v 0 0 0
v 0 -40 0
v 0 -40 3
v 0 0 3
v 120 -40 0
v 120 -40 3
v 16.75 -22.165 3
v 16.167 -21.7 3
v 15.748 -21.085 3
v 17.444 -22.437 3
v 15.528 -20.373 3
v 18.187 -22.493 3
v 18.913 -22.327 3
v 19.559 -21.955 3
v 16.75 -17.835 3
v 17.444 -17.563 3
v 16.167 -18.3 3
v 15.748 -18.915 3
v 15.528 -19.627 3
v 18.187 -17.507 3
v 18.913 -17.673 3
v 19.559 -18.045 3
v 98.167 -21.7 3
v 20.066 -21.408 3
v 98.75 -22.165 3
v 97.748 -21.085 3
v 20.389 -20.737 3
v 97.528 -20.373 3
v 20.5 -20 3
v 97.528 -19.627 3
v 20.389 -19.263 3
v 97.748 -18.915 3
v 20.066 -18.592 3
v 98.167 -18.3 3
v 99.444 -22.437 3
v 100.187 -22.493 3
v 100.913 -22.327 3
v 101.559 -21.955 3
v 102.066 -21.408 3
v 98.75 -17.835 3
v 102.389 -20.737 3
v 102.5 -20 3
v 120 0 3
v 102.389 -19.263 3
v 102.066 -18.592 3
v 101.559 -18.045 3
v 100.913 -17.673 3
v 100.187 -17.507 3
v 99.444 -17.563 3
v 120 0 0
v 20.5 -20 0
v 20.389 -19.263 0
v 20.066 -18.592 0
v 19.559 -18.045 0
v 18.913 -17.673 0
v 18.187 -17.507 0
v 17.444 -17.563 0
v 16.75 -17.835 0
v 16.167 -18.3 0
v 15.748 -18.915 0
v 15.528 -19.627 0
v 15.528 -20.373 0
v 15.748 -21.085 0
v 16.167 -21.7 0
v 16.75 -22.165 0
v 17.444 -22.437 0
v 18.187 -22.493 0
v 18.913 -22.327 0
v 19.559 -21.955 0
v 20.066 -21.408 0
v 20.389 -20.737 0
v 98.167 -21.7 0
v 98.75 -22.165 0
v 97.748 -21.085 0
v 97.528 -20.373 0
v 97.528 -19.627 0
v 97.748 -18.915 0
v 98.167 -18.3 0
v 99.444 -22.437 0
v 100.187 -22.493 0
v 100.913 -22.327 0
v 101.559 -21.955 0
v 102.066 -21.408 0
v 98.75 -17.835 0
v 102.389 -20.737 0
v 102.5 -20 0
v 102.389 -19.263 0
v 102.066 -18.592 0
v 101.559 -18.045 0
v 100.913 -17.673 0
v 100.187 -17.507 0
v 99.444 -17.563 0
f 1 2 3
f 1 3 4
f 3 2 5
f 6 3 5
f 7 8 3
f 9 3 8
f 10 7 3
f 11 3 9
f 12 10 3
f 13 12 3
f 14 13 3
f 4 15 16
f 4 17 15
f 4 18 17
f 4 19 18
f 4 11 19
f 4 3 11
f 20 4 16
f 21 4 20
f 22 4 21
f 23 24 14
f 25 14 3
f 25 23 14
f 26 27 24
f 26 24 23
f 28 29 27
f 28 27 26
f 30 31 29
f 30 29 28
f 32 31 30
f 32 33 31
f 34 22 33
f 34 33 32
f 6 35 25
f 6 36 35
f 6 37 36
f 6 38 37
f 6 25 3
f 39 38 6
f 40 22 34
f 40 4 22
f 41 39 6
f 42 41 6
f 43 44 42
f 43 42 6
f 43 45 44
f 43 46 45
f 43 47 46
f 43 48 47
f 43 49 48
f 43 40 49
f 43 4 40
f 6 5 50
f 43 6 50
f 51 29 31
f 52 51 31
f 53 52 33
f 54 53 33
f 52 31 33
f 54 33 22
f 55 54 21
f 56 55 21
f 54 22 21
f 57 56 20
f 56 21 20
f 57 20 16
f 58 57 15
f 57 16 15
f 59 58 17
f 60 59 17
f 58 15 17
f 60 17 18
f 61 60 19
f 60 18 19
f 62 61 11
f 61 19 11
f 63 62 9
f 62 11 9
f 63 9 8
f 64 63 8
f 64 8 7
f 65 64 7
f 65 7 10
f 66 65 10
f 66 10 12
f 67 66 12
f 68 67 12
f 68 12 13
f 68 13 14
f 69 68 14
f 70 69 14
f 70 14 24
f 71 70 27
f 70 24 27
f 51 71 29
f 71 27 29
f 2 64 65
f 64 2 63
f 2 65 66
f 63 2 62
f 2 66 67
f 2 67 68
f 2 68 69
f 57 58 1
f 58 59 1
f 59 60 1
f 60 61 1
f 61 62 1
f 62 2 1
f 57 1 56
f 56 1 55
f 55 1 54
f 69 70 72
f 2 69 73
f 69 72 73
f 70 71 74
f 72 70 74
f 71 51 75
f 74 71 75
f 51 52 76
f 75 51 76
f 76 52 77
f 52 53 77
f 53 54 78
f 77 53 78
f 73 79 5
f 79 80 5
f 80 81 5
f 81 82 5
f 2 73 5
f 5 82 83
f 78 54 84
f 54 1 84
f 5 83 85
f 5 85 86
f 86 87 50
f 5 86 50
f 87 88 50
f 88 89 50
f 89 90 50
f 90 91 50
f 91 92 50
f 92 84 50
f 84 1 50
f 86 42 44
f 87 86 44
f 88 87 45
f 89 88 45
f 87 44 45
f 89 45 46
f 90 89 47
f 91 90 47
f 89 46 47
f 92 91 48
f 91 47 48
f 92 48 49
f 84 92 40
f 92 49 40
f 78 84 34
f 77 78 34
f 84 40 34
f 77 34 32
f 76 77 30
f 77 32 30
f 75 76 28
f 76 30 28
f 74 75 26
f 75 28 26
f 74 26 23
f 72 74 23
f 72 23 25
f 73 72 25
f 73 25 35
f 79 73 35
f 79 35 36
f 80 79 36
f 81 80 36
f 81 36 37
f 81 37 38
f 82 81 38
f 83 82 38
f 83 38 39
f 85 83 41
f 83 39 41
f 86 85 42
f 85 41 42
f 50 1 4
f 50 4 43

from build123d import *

# Parameters (mm, degrees)
SCHIZZO1_W                   = 120
SCHIZZO1_H                   = 40
ESTRUSIONE_ESTRUSIONE1_DEPTH = 3
SCHIZZO2_R                   = 2.5
TAGLIO_ESTRUSIONE1_DEPTH     = 3
SCHIZZO3_R                   = 2.5
TAGLIO_ESTRUSIONE2_DEPTH     = 3


with BuildPart() as part:
    # Schizzo1 → Estrusione-Estrusione1 (new body)
    with BuildSketch(Plane.XY):
        with Locations((60, -20)):
            Rectangle(SCHIZZO1_W, SCHIZZO1_H)
    extrude(amount=ESTRUSIONE_ESTRUSIONE1_DEPTH)

    # Schizzo2 → Taglio-Estrusione1 (cut)
    with BuildSketch(Plane.XY.offset(3)):
        with Locations((18, -20)):
            Circle(SCHIZZO2_R)
    extrude(amount=-TAGLIO_ESTRUSIONE1_DEPTH, mode=Mode.SUBTRACT)

    # Schizzo3 → Taglio-Estrusione2 (cut)
    with BuildSketch(Plane.XY.offset(3)):
        with Locations((100, -20)):
            Circle(SCHIZZO3_R)
    extrude(amount=-TAGLIO_ESTRUSIONE2_DEPTH, mode=Mode.SUBTRACT)


solid = part.part
